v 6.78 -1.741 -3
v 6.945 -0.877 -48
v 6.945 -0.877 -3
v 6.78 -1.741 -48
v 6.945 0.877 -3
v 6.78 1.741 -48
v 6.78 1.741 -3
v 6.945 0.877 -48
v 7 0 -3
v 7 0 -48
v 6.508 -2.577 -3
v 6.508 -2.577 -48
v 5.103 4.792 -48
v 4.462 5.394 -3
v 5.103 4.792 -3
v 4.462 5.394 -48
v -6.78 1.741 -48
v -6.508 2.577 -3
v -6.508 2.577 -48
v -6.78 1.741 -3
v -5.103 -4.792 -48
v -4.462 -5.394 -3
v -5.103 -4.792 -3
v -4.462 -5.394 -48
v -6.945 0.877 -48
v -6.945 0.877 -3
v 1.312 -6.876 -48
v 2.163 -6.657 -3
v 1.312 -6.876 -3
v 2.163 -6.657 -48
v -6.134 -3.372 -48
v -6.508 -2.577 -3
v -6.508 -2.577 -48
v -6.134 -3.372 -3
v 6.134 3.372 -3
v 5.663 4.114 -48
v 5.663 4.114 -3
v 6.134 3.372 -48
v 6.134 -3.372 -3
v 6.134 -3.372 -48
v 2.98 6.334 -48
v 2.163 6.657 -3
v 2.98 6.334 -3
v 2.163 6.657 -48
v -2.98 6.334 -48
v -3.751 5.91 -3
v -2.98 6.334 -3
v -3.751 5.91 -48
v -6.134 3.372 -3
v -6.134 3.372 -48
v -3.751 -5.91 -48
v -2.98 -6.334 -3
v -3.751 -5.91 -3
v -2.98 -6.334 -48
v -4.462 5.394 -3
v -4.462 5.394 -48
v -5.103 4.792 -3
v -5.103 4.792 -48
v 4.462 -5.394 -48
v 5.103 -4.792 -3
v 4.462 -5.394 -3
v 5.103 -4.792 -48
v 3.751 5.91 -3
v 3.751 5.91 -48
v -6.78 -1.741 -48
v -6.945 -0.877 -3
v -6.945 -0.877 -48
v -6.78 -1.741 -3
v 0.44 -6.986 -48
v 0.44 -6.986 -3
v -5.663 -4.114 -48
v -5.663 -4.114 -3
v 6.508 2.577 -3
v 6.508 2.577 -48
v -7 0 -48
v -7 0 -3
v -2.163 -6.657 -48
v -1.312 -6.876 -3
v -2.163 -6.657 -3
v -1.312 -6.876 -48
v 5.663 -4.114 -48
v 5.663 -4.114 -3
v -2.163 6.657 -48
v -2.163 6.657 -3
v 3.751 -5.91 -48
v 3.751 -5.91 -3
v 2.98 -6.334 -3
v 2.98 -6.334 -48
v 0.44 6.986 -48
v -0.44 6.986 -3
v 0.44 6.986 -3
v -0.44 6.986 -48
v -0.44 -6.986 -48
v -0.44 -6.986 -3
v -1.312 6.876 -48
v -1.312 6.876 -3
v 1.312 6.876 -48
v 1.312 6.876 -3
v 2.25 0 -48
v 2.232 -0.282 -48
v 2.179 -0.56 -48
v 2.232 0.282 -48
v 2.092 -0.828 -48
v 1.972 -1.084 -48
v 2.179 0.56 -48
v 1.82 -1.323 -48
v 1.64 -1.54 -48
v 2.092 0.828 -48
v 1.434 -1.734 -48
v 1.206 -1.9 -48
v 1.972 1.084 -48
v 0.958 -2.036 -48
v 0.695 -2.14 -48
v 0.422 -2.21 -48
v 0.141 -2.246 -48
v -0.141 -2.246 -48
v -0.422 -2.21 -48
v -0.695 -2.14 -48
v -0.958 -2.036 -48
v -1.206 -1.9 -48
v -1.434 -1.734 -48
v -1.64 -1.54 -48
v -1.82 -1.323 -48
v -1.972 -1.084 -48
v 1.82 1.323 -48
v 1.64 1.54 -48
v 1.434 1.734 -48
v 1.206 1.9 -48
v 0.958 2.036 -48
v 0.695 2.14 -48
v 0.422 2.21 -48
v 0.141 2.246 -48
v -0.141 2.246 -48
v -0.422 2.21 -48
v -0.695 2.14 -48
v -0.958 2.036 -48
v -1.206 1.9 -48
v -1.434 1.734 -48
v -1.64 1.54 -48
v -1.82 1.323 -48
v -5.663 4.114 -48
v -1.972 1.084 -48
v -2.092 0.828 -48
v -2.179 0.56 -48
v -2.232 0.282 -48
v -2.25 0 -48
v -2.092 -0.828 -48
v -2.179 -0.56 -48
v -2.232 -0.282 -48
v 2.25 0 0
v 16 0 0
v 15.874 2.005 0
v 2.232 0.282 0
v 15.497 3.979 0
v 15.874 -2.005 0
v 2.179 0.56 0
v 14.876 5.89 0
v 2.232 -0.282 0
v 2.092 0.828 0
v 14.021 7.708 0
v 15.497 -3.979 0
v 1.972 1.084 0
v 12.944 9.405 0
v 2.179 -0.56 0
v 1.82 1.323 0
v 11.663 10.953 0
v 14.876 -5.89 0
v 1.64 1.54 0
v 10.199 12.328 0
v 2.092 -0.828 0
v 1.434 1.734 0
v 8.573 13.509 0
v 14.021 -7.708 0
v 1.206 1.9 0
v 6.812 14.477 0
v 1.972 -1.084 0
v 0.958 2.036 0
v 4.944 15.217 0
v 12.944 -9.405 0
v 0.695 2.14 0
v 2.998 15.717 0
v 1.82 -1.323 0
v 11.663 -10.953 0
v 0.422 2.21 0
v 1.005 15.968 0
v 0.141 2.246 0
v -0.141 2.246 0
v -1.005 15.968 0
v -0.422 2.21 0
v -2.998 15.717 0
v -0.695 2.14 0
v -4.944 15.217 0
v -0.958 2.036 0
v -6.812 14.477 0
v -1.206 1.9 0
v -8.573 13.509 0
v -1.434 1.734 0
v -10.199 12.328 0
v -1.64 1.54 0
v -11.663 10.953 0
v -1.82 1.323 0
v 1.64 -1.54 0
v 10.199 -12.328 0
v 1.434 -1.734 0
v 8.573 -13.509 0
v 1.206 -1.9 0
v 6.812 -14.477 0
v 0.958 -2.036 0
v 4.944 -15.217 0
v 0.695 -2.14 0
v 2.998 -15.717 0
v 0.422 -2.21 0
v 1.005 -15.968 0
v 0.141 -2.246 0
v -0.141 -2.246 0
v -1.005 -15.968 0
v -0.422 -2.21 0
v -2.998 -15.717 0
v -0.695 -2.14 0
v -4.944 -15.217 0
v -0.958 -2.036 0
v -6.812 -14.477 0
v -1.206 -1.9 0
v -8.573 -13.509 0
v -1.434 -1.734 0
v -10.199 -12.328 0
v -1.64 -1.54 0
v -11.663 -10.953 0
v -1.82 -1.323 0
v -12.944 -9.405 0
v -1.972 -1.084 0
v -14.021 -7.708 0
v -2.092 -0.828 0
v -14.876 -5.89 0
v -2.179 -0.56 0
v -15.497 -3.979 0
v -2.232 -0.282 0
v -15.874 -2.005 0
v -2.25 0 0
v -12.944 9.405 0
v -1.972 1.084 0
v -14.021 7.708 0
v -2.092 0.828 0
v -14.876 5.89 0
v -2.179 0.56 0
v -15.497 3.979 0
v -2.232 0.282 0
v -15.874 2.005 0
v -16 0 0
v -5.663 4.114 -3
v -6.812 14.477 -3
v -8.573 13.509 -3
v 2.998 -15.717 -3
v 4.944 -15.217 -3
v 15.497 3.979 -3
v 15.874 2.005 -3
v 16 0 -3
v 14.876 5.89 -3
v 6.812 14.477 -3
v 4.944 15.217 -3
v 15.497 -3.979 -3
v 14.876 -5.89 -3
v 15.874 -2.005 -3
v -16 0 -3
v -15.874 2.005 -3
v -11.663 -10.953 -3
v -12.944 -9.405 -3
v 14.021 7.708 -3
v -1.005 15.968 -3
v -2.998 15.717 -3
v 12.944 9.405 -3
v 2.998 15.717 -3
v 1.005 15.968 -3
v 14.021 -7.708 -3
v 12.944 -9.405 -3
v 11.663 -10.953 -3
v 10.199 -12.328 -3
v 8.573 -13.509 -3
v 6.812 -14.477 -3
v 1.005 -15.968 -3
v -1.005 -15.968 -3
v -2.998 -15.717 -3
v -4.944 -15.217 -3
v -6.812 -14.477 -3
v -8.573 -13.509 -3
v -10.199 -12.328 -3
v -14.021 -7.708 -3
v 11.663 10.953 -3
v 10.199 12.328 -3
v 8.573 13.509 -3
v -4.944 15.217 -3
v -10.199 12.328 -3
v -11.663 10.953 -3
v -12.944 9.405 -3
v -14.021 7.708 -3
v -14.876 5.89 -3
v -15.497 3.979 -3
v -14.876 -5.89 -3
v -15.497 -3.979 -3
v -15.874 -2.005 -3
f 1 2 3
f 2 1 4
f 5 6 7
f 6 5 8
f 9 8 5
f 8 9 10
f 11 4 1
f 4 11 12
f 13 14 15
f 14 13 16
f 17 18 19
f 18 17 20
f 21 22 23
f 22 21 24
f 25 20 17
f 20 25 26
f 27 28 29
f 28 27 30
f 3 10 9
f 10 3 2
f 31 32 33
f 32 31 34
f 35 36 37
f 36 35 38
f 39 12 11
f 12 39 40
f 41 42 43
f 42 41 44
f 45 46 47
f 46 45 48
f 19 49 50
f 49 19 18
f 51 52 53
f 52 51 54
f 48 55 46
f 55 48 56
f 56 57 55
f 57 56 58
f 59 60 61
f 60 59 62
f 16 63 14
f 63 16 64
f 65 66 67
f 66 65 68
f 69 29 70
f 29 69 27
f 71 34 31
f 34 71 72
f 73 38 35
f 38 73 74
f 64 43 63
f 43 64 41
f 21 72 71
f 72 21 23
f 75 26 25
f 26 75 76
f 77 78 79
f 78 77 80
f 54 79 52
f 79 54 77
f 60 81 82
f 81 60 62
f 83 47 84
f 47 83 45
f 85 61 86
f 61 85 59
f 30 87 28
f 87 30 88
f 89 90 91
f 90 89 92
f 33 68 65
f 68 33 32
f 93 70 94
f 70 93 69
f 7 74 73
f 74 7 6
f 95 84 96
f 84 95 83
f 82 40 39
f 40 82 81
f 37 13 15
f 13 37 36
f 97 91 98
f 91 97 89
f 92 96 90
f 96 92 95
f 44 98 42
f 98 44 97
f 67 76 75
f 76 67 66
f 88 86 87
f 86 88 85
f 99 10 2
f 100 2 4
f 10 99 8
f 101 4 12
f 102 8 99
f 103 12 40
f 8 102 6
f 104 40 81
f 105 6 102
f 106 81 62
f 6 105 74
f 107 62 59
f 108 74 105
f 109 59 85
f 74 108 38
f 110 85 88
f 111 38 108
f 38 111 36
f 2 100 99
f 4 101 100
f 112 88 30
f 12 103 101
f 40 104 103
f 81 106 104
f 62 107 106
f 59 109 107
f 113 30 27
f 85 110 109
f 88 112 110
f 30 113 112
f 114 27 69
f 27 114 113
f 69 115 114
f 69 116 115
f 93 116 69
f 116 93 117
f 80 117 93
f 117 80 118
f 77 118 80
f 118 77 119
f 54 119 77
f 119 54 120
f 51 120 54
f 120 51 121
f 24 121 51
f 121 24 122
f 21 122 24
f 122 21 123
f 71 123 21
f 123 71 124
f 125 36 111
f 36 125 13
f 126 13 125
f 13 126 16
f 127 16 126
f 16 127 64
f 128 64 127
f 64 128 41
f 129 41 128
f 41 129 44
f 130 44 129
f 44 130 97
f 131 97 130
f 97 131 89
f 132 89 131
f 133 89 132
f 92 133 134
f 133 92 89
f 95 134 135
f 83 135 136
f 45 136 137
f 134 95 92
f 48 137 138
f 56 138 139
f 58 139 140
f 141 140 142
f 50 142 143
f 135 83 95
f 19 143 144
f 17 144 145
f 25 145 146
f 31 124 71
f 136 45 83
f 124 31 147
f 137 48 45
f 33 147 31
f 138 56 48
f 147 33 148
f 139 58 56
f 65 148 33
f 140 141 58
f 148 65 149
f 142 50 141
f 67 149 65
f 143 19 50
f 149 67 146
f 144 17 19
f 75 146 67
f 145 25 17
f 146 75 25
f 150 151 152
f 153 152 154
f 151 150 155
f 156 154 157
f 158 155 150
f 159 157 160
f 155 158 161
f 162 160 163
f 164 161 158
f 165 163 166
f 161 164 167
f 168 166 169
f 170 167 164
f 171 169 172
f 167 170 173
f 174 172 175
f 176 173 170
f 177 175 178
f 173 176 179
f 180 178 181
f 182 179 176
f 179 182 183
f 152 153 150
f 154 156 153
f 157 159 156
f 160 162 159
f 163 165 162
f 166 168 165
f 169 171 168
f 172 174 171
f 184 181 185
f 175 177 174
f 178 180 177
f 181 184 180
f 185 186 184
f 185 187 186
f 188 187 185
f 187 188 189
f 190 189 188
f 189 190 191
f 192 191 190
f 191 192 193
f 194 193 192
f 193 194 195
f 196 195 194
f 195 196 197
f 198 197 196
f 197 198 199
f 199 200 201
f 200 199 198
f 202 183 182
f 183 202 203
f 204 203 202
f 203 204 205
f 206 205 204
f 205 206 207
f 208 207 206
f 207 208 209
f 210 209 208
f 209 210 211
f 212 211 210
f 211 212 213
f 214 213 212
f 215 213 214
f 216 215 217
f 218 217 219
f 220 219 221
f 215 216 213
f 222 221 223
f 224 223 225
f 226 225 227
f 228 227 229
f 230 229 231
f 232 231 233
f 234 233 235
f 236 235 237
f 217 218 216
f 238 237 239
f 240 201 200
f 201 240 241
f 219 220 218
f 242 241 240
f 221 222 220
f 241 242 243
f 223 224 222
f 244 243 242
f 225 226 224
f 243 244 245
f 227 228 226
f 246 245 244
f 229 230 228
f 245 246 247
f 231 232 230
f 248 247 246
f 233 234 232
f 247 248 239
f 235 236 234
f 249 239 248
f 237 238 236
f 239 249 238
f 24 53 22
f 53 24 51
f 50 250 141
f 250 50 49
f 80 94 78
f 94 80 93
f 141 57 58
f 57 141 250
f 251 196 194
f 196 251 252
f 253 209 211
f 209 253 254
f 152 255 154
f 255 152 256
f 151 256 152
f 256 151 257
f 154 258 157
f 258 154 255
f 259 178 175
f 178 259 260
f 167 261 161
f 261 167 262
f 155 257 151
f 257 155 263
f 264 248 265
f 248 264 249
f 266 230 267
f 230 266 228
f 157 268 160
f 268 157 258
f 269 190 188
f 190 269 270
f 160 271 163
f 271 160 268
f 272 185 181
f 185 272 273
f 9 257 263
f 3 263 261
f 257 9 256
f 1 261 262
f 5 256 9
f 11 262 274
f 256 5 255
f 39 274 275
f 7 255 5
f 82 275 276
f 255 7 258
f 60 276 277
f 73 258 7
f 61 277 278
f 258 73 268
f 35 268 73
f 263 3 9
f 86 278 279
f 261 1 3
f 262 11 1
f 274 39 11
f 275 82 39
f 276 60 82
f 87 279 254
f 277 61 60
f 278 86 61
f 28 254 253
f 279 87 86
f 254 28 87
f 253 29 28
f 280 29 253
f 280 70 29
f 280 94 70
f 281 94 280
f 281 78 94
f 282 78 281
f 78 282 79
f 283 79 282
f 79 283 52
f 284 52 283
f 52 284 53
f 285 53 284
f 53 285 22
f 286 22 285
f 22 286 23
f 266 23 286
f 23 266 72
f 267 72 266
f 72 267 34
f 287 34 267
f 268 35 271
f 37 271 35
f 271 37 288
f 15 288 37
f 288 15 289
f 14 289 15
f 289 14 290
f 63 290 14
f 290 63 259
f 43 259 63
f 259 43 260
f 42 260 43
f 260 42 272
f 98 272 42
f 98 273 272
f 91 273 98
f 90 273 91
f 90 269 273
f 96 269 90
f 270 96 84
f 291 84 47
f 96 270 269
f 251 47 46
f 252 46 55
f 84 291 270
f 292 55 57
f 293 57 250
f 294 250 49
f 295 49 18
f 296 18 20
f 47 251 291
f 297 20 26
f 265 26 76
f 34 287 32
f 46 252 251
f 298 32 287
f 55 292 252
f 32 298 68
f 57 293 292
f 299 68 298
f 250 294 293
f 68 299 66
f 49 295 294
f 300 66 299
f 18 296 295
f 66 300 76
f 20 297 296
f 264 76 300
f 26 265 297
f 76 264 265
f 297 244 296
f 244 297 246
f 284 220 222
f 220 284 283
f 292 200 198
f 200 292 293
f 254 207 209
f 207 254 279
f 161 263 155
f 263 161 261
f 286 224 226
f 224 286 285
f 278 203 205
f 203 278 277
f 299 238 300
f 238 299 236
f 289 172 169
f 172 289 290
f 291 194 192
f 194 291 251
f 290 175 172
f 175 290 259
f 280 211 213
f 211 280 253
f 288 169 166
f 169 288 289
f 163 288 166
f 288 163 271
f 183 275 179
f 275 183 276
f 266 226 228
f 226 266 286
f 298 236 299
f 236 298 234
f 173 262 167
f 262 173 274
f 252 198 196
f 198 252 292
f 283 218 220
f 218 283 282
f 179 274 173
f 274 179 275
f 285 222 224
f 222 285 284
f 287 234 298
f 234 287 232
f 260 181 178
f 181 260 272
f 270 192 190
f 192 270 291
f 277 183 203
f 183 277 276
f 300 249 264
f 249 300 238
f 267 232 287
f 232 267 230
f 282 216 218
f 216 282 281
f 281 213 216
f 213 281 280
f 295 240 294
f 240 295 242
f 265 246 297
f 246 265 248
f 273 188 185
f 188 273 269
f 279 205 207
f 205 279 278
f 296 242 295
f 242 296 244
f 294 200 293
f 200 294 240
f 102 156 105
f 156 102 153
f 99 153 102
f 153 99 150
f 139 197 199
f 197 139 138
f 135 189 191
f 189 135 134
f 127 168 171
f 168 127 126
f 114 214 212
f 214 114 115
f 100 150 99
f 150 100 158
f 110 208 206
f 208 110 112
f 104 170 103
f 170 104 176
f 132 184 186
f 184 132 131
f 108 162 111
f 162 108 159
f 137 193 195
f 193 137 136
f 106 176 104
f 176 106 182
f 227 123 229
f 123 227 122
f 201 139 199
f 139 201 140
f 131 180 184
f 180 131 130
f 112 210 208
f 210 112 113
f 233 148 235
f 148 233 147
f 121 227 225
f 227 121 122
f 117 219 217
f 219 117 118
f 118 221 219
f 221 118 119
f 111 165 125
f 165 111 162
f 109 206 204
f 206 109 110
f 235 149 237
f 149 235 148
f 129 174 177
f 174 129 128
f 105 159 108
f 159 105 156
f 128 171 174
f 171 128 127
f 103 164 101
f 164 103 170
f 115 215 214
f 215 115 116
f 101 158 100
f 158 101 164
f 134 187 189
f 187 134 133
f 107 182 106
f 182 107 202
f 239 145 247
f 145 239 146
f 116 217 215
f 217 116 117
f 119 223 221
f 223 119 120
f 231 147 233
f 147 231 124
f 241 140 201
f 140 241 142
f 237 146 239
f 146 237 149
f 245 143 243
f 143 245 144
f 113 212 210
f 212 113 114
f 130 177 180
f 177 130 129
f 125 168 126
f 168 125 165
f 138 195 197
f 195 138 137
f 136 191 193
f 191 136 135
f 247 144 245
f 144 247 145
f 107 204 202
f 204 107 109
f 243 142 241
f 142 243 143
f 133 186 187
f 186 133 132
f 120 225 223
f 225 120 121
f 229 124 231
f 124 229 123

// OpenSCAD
$fn = 50;


difference() {
	union() {
		translate(v = [0, 0, -48.0000000000]) {
			cylinder(h = 48, r = 7.0000000000);
		}
		translate(v = [0, 0, -3.0000000000]) {
			cylinder(h = 3, r = 16.0000000000);
		}
	}
	union() {
		#translate(v = [0, 0, -48]) {
			cylinder(h = 48, r = 2.2500000000);
		}
	}
}
